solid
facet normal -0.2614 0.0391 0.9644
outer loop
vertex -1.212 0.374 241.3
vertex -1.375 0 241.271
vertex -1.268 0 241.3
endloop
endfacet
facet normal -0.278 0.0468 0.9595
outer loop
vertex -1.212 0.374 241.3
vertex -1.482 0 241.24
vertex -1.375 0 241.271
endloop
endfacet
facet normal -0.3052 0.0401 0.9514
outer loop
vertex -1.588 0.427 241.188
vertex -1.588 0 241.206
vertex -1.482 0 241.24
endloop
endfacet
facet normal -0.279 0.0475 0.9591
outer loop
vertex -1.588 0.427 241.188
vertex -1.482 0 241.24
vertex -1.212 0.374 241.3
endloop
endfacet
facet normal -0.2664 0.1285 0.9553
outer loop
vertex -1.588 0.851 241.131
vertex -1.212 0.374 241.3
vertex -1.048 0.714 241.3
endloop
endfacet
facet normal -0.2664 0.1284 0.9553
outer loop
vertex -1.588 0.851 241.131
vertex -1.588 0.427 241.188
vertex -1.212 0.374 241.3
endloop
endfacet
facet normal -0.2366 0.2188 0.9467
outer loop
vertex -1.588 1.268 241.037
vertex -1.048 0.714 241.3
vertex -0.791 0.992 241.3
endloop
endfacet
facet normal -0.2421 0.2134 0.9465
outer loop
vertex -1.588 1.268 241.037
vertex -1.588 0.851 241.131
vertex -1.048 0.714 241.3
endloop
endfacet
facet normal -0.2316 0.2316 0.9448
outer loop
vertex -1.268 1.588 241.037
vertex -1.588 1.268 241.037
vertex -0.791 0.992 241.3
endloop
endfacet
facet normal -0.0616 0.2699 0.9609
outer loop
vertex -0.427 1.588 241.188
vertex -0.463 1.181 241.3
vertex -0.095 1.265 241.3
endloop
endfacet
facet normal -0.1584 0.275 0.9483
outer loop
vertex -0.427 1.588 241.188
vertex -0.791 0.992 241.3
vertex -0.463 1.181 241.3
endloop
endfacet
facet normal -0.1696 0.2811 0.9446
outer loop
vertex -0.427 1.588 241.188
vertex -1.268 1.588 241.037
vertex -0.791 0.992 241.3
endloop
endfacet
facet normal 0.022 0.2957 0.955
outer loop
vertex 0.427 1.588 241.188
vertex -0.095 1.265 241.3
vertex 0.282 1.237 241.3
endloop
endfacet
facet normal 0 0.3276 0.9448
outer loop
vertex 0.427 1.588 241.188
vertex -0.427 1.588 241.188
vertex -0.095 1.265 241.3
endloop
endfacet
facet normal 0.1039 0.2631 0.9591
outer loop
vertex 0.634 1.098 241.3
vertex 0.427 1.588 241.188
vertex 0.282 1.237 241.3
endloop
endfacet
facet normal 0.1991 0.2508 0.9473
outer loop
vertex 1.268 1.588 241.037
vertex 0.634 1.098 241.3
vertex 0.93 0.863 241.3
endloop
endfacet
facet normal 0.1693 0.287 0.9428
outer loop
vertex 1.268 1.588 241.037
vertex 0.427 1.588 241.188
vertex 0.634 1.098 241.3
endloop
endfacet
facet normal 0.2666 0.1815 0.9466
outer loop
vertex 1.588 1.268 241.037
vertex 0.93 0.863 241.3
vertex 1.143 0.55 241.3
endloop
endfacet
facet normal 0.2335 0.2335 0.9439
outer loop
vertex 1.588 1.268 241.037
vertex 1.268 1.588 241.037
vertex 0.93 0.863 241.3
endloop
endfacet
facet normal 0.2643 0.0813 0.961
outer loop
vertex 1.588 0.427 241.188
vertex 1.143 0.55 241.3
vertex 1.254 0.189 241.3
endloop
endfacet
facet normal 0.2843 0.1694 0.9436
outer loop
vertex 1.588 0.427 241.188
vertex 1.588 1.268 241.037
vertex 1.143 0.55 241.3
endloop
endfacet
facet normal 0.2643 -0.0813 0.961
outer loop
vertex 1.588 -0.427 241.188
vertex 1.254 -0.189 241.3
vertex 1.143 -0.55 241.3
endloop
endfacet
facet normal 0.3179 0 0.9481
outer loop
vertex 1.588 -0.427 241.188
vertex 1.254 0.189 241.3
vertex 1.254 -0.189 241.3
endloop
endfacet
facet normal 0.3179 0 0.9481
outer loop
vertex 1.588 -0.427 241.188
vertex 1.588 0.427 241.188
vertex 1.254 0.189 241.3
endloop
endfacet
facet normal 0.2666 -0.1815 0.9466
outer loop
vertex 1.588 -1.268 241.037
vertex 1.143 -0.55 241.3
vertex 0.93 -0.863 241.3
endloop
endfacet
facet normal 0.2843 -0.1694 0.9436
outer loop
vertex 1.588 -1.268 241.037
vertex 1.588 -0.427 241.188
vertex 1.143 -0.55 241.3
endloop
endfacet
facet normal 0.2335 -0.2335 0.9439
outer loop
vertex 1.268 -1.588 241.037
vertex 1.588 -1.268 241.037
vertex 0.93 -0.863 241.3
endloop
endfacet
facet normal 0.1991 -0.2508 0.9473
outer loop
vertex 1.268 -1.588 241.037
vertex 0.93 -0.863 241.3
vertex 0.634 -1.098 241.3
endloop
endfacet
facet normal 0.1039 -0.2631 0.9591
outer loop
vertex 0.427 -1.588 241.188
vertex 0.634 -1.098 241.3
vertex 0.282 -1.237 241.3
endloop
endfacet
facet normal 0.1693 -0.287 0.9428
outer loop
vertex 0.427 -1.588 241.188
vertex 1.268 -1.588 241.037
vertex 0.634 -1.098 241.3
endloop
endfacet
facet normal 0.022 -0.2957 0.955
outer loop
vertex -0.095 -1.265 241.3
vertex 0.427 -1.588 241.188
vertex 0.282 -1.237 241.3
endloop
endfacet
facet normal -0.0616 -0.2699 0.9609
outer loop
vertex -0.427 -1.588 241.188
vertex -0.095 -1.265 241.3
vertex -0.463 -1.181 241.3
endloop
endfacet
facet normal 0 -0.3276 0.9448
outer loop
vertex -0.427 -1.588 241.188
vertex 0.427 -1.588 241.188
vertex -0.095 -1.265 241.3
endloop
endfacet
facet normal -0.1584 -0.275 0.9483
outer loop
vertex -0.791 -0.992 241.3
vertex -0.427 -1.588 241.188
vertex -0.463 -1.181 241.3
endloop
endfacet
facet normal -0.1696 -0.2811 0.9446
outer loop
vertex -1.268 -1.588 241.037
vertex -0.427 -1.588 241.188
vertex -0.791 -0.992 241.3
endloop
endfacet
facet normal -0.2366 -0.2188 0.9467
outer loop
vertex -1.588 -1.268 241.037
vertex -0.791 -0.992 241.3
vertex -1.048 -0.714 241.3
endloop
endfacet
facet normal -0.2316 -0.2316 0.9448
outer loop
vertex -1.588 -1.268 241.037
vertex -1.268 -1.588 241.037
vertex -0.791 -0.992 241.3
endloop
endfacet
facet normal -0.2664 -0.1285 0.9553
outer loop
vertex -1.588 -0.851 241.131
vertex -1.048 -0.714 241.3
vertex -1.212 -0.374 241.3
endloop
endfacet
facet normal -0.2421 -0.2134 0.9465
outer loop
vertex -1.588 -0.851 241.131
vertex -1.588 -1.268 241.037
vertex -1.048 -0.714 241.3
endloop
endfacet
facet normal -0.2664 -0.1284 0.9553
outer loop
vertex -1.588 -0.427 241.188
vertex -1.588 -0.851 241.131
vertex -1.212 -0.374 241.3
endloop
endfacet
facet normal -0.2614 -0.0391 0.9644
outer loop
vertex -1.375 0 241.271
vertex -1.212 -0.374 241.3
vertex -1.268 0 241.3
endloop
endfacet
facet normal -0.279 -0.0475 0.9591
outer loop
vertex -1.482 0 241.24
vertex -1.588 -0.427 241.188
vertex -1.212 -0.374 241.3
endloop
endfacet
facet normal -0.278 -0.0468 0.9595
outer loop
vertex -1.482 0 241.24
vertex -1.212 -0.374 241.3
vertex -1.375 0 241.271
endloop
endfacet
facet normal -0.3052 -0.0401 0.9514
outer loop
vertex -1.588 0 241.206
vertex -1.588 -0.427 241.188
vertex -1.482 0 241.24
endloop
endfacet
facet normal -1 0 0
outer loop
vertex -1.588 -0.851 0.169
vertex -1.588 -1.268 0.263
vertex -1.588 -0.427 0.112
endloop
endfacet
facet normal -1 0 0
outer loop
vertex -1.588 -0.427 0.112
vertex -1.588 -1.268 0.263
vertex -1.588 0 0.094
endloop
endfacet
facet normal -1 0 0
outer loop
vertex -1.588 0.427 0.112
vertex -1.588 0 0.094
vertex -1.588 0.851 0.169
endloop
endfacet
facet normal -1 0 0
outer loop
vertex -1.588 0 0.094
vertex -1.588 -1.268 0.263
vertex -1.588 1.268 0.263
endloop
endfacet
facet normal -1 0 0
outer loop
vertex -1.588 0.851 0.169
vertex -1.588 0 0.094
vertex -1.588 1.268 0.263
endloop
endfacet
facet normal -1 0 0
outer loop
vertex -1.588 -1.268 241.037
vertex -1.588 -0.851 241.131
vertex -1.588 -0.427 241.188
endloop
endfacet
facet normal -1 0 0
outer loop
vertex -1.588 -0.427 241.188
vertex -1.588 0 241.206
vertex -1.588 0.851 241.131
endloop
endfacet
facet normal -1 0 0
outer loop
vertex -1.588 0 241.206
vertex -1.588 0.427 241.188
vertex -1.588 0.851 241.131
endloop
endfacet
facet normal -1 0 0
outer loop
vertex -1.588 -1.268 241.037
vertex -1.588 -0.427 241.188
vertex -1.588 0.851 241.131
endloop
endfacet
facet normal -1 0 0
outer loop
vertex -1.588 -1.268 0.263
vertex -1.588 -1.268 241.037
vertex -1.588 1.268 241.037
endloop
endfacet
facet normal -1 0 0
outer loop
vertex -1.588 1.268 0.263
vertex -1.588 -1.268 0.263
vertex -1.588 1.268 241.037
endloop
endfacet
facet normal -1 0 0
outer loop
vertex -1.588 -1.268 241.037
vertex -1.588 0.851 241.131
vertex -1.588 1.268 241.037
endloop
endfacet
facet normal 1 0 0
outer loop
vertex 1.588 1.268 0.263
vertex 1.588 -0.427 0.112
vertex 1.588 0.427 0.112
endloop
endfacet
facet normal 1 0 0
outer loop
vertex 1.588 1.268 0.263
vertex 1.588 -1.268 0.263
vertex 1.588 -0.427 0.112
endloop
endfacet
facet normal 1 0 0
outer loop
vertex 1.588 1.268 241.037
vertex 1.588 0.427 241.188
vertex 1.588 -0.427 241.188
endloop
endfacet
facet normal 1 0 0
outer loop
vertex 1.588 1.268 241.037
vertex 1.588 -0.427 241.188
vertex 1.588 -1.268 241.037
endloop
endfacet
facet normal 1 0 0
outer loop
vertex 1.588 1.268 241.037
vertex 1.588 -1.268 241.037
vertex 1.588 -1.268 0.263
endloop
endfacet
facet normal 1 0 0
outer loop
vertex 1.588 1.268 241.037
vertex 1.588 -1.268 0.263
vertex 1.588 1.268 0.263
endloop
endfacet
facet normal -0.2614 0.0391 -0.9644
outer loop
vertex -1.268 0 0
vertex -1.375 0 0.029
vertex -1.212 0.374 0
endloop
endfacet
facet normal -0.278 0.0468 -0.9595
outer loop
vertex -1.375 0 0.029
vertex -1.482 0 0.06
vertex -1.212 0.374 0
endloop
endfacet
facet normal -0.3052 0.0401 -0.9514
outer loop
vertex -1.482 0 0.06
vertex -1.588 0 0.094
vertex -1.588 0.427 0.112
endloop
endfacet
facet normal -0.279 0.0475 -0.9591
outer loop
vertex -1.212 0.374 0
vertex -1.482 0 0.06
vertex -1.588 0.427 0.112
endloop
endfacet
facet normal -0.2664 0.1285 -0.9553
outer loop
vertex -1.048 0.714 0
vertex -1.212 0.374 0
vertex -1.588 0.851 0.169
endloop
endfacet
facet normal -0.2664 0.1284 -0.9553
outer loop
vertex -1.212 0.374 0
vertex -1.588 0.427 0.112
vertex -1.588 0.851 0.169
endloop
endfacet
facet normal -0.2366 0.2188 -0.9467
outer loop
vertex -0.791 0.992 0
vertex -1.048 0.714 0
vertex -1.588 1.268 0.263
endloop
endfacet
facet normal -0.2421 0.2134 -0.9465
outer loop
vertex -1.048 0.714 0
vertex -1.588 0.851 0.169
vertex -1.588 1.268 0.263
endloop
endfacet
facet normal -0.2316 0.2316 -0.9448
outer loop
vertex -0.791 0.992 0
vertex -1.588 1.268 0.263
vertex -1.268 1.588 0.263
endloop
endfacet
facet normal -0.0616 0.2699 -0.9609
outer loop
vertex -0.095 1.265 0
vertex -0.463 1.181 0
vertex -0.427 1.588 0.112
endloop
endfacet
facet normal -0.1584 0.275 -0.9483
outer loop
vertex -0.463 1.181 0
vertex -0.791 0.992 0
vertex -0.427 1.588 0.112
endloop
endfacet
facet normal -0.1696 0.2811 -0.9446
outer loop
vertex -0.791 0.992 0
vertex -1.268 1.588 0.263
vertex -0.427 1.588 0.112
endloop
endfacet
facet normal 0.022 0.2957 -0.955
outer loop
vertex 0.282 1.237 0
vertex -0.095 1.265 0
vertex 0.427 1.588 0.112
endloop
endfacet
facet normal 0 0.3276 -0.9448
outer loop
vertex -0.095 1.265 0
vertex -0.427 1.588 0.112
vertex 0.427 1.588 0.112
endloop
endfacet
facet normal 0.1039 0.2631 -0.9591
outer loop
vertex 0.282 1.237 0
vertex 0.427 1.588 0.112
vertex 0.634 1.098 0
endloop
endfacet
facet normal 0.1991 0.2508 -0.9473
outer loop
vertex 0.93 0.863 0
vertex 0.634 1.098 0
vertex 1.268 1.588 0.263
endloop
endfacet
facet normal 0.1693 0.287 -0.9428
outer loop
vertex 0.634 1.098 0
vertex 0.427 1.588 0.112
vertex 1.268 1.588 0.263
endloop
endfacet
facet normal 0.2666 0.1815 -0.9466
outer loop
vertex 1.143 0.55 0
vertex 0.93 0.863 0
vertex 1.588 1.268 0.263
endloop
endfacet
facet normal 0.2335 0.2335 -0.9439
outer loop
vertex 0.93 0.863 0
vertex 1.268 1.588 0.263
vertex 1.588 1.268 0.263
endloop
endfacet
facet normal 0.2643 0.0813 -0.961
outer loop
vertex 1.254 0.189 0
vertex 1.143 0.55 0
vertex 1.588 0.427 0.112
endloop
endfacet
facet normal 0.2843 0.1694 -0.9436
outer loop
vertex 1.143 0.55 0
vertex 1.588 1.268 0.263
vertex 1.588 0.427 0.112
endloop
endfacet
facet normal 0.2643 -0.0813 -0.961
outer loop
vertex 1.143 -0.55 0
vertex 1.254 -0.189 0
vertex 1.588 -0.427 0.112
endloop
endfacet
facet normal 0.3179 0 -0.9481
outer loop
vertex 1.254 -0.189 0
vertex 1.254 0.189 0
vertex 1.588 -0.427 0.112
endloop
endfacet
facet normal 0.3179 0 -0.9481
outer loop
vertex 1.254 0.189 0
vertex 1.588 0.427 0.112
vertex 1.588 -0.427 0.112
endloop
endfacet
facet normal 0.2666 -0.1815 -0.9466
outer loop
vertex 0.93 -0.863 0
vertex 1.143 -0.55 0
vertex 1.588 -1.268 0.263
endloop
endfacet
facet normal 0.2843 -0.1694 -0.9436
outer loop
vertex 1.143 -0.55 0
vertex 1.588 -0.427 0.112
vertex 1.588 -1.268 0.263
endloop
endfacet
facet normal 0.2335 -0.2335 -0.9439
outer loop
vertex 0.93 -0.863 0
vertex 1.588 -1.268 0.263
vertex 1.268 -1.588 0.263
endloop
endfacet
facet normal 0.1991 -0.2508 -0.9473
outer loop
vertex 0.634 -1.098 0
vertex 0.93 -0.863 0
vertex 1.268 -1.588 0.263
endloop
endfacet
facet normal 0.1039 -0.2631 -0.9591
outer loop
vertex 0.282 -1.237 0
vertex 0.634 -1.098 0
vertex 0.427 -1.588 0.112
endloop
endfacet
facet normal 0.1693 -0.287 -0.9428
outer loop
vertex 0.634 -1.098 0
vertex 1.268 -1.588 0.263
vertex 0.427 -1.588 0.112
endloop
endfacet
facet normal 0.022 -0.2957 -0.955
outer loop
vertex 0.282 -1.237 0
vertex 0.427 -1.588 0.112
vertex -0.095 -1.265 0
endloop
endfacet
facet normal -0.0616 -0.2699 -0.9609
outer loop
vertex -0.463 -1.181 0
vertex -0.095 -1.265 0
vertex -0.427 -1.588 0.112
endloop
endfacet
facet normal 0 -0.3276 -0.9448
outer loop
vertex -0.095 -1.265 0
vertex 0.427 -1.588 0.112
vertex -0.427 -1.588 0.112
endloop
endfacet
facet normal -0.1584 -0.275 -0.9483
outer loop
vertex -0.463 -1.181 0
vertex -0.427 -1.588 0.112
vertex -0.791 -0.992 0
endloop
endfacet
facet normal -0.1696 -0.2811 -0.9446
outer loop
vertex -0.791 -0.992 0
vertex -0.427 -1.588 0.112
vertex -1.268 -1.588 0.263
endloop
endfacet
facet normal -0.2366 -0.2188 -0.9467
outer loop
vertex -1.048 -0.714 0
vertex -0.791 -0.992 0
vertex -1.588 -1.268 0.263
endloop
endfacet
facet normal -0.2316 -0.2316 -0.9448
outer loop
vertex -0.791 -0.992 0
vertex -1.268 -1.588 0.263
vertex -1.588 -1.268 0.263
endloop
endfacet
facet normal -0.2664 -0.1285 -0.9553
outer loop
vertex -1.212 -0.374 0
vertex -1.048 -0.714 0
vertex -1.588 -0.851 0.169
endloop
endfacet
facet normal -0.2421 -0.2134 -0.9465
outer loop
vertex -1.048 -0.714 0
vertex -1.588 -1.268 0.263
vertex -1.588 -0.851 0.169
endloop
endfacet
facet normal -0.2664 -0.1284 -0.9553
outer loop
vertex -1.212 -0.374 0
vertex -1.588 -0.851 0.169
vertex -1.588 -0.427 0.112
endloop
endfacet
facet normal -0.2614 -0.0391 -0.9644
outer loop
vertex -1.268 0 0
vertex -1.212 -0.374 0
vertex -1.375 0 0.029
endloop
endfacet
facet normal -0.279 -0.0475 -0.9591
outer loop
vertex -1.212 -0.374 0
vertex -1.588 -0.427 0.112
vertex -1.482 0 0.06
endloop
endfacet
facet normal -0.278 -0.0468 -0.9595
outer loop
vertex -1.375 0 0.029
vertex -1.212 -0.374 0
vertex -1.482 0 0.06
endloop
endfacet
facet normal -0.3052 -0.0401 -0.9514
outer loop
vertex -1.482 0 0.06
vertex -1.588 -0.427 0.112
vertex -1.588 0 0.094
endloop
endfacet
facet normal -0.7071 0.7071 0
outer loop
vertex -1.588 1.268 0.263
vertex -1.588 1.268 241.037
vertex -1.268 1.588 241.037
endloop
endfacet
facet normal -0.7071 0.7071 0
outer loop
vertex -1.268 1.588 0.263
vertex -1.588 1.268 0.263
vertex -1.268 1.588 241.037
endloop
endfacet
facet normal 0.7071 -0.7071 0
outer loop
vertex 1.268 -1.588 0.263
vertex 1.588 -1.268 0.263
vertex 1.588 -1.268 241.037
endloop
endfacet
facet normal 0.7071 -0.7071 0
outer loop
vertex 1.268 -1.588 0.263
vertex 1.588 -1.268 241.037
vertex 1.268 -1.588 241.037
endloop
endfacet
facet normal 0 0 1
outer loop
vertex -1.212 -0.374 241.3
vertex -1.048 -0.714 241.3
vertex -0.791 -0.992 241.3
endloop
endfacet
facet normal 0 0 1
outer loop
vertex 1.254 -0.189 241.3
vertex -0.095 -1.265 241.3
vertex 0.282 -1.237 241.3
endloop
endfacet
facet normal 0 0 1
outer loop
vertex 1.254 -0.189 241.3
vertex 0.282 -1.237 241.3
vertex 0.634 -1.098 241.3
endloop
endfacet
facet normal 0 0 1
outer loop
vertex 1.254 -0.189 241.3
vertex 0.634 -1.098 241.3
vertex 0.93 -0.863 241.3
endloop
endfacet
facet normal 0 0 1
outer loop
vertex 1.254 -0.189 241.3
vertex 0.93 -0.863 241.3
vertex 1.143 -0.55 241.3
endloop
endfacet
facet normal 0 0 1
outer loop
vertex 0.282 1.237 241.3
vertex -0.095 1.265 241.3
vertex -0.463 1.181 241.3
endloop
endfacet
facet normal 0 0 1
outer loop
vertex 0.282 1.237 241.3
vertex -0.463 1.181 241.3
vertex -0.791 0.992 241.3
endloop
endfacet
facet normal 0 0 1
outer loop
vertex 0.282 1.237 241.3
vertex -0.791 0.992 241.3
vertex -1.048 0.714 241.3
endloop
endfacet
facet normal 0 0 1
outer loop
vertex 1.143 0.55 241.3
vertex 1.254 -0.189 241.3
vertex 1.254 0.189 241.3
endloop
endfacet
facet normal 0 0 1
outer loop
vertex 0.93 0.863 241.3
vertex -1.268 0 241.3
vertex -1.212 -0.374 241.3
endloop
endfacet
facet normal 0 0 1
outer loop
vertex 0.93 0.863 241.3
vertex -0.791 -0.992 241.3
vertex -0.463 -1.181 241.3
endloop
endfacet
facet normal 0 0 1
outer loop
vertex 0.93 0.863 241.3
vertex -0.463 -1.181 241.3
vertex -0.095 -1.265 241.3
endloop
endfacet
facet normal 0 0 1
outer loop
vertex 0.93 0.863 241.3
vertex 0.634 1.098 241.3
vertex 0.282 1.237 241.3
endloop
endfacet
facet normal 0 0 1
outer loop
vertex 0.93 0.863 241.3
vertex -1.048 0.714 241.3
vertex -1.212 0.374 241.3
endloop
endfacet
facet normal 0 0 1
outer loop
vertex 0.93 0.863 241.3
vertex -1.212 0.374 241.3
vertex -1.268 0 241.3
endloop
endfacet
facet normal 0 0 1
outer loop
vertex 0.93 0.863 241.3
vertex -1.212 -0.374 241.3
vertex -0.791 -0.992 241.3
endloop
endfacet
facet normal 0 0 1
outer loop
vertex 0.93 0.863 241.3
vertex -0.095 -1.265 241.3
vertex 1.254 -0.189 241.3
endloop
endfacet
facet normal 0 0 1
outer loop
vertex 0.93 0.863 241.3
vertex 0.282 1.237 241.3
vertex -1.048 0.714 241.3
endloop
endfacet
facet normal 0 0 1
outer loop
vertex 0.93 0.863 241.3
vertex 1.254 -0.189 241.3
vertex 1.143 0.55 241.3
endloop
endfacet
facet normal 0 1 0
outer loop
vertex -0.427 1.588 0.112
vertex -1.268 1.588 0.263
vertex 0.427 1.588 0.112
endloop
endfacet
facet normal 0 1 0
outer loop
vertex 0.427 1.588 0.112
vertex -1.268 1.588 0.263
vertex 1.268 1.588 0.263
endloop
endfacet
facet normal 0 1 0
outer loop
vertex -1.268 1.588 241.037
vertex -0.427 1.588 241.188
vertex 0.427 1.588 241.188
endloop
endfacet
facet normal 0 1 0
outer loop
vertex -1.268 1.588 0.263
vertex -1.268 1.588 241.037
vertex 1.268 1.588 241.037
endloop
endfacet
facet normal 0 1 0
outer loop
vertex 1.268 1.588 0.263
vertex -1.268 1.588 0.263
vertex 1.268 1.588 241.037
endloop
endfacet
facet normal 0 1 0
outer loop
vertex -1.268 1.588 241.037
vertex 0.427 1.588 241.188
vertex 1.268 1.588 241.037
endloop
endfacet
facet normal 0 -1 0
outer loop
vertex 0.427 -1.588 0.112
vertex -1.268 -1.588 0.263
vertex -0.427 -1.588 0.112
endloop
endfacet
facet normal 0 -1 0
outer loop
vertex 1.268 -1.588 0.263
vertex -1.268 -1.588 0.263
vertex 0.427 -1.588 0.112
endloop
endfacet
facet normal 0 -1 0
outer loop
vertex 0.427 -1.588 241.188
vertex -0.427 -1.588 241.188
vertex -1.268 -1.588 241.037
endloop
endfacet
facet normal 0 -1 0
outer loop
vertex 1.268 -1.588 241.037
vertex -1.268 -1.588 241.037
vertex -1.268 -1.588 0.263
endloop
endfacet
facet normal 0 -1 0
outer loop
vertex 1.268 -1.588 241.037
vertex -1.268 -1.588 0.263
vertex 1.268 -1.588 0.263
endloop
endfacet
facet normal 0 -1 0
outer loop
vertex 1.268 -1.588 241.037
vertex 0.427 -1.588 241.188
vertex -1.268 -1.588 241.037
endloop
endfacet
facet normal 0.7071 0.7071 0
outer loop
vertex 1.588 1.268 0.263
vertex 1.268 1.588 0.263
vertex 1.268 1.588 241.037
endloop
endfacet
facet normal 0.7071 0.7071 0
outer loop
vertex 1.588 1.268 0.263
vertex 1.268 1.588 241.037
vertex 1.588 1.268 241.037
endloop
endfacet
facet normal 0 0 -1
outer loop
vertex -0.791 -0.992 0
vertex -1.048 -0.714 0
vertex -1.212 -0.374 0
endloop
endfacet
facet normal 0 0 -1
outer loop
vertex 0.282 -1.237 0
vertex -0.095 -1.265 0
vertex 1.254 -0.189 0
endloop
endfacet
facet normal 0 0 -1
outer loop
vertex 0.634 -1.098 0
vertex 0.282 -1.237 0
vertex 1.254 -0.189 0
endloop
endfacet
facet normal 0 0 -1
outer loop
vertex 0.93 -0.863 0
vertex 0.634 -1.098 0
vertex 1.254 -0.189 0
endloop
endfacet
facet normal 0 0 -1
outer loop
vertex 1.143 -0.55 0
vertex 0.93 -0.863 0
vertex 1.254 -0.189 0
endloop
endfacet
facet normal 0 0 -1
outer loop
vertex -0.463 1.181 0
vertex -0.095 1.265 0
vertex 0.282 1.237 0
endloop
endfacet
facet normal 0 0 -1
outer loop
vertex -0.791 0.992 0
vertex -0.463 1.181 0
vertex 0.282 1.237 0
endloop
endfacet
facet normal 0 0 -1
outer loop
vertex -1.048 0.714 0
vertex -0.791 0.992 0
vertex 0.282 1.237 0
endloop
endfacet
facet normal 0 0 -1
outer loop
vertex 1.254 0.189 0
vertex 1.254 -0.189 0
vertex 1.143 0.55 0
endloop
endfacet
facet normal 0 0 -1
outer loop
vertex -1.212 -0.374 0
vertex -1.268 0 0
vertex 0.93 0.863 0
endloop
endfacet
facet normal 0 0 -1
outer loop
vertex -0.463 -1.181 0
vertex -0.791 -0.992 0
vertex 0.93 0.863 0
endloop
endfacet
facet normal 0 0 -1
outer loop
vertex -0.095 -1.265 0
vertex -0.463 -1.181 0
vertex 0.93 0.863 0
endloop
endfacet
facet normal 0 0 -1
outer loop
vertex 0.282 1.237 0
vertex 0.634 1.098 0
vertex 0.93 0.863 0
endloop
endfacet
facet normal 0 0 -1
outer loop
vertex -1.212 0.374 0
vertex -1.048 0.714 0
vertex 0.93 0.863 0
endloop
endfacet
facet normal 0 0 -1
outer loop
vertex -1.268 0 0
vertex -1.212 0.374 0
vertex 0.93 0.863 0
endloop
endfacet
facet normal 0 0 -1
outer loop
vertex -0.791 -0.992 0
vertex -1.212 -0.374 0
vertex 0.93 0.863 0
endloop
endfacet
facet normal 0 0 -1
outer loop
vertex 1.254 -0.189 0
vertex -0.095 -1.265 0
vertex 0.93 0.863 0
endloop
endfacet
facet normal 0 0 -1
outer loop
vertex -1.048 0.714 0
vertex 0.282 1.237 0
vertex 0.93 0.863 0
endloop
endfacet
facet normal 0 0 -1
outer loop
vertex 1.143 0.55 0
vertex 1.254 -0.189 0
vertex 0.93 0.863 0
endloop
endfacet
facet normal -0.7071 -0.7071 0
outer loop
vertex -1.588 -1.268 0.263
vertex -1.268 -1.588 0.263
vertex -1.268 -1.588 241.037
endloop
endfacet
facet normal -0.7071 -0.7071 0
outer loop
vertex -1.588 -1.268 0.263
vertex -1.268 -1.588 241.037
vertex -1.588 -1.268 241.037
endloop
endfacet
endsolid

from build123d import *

# Parameters (mm, degrees)
SKETCH1_W           = 3.175
SKETCH1_H           = 3.175
BOSS_EXTRUDE1_DEPTH = 120.65
SKETCH2_OUTSIDE_W   = 29.322
SKETCH2_OUTSIDE_H   = 29.322
SKETCH2_OUTSIDE_R   = 2.032
CUT_EXTRUDE1_DEPTH  = 121.65


with BuildPart() as part:
    # Sketch1 → Boss-Extrude1 (new body)
    with BuildSketch(Plane.XY):
        Rectangle(SKETCH1_W, SKETCH1_H)
    extrude(amount=BOSS_EXTRUDE1_DEPTH)

    # Sketch2 outside → Cut-Extrude1 (cut, through all)
    with BuildSketch(Plane(origin=(0, 0, 0), x_dir=(-1, 0, 0), z_dir=(0, 0, -1))):
        Rectangle(SKETCH2_OUTSIDE_W, SKETCH2_OUTSIDE_H)
        Circle(SKETCH2_OUTSIDE_R, mode=Mode.SUBTRACT)
    extrude(amount=-CUT_EXTRUDE1_DEPTH, mode=Mode.SUBTRACT)

    # Sketch3 → Cut-Revolve1 (revolve, cut)
    with BuildSketch(Plane(origin=(0, 0, 0), x_dir=(1, 0, 0), z_dir=(0, 1, 0))):
        with BuildLine():
            Line((-5.053685963, -4.40273269), (-5.053685963, 5.740530545))
            Line((-5.053685963, 5.740530545), (0, 5.740530545))
            Line((0, 5.740530545), (0, 0.160877736))
            ThreePointArc((0, 0.160877736), (-3.404639553, -1.148866368), (-5.053685963, -4.40273269))
        make_face()
    revolve(axis=Axis((0, 0, 120.65), (0, 0, -1)), mode=Mode.SUBTRACT)

    # Mirror1: part across plane


with BuildPart() as part_1:
    add(part.part)
    add(part.part.mirror(Plane(origin=(0, 0, 120.65), x_dir=(1, 0, 0), z_dir=(0, 0, -1))))


solid = part_1.part
